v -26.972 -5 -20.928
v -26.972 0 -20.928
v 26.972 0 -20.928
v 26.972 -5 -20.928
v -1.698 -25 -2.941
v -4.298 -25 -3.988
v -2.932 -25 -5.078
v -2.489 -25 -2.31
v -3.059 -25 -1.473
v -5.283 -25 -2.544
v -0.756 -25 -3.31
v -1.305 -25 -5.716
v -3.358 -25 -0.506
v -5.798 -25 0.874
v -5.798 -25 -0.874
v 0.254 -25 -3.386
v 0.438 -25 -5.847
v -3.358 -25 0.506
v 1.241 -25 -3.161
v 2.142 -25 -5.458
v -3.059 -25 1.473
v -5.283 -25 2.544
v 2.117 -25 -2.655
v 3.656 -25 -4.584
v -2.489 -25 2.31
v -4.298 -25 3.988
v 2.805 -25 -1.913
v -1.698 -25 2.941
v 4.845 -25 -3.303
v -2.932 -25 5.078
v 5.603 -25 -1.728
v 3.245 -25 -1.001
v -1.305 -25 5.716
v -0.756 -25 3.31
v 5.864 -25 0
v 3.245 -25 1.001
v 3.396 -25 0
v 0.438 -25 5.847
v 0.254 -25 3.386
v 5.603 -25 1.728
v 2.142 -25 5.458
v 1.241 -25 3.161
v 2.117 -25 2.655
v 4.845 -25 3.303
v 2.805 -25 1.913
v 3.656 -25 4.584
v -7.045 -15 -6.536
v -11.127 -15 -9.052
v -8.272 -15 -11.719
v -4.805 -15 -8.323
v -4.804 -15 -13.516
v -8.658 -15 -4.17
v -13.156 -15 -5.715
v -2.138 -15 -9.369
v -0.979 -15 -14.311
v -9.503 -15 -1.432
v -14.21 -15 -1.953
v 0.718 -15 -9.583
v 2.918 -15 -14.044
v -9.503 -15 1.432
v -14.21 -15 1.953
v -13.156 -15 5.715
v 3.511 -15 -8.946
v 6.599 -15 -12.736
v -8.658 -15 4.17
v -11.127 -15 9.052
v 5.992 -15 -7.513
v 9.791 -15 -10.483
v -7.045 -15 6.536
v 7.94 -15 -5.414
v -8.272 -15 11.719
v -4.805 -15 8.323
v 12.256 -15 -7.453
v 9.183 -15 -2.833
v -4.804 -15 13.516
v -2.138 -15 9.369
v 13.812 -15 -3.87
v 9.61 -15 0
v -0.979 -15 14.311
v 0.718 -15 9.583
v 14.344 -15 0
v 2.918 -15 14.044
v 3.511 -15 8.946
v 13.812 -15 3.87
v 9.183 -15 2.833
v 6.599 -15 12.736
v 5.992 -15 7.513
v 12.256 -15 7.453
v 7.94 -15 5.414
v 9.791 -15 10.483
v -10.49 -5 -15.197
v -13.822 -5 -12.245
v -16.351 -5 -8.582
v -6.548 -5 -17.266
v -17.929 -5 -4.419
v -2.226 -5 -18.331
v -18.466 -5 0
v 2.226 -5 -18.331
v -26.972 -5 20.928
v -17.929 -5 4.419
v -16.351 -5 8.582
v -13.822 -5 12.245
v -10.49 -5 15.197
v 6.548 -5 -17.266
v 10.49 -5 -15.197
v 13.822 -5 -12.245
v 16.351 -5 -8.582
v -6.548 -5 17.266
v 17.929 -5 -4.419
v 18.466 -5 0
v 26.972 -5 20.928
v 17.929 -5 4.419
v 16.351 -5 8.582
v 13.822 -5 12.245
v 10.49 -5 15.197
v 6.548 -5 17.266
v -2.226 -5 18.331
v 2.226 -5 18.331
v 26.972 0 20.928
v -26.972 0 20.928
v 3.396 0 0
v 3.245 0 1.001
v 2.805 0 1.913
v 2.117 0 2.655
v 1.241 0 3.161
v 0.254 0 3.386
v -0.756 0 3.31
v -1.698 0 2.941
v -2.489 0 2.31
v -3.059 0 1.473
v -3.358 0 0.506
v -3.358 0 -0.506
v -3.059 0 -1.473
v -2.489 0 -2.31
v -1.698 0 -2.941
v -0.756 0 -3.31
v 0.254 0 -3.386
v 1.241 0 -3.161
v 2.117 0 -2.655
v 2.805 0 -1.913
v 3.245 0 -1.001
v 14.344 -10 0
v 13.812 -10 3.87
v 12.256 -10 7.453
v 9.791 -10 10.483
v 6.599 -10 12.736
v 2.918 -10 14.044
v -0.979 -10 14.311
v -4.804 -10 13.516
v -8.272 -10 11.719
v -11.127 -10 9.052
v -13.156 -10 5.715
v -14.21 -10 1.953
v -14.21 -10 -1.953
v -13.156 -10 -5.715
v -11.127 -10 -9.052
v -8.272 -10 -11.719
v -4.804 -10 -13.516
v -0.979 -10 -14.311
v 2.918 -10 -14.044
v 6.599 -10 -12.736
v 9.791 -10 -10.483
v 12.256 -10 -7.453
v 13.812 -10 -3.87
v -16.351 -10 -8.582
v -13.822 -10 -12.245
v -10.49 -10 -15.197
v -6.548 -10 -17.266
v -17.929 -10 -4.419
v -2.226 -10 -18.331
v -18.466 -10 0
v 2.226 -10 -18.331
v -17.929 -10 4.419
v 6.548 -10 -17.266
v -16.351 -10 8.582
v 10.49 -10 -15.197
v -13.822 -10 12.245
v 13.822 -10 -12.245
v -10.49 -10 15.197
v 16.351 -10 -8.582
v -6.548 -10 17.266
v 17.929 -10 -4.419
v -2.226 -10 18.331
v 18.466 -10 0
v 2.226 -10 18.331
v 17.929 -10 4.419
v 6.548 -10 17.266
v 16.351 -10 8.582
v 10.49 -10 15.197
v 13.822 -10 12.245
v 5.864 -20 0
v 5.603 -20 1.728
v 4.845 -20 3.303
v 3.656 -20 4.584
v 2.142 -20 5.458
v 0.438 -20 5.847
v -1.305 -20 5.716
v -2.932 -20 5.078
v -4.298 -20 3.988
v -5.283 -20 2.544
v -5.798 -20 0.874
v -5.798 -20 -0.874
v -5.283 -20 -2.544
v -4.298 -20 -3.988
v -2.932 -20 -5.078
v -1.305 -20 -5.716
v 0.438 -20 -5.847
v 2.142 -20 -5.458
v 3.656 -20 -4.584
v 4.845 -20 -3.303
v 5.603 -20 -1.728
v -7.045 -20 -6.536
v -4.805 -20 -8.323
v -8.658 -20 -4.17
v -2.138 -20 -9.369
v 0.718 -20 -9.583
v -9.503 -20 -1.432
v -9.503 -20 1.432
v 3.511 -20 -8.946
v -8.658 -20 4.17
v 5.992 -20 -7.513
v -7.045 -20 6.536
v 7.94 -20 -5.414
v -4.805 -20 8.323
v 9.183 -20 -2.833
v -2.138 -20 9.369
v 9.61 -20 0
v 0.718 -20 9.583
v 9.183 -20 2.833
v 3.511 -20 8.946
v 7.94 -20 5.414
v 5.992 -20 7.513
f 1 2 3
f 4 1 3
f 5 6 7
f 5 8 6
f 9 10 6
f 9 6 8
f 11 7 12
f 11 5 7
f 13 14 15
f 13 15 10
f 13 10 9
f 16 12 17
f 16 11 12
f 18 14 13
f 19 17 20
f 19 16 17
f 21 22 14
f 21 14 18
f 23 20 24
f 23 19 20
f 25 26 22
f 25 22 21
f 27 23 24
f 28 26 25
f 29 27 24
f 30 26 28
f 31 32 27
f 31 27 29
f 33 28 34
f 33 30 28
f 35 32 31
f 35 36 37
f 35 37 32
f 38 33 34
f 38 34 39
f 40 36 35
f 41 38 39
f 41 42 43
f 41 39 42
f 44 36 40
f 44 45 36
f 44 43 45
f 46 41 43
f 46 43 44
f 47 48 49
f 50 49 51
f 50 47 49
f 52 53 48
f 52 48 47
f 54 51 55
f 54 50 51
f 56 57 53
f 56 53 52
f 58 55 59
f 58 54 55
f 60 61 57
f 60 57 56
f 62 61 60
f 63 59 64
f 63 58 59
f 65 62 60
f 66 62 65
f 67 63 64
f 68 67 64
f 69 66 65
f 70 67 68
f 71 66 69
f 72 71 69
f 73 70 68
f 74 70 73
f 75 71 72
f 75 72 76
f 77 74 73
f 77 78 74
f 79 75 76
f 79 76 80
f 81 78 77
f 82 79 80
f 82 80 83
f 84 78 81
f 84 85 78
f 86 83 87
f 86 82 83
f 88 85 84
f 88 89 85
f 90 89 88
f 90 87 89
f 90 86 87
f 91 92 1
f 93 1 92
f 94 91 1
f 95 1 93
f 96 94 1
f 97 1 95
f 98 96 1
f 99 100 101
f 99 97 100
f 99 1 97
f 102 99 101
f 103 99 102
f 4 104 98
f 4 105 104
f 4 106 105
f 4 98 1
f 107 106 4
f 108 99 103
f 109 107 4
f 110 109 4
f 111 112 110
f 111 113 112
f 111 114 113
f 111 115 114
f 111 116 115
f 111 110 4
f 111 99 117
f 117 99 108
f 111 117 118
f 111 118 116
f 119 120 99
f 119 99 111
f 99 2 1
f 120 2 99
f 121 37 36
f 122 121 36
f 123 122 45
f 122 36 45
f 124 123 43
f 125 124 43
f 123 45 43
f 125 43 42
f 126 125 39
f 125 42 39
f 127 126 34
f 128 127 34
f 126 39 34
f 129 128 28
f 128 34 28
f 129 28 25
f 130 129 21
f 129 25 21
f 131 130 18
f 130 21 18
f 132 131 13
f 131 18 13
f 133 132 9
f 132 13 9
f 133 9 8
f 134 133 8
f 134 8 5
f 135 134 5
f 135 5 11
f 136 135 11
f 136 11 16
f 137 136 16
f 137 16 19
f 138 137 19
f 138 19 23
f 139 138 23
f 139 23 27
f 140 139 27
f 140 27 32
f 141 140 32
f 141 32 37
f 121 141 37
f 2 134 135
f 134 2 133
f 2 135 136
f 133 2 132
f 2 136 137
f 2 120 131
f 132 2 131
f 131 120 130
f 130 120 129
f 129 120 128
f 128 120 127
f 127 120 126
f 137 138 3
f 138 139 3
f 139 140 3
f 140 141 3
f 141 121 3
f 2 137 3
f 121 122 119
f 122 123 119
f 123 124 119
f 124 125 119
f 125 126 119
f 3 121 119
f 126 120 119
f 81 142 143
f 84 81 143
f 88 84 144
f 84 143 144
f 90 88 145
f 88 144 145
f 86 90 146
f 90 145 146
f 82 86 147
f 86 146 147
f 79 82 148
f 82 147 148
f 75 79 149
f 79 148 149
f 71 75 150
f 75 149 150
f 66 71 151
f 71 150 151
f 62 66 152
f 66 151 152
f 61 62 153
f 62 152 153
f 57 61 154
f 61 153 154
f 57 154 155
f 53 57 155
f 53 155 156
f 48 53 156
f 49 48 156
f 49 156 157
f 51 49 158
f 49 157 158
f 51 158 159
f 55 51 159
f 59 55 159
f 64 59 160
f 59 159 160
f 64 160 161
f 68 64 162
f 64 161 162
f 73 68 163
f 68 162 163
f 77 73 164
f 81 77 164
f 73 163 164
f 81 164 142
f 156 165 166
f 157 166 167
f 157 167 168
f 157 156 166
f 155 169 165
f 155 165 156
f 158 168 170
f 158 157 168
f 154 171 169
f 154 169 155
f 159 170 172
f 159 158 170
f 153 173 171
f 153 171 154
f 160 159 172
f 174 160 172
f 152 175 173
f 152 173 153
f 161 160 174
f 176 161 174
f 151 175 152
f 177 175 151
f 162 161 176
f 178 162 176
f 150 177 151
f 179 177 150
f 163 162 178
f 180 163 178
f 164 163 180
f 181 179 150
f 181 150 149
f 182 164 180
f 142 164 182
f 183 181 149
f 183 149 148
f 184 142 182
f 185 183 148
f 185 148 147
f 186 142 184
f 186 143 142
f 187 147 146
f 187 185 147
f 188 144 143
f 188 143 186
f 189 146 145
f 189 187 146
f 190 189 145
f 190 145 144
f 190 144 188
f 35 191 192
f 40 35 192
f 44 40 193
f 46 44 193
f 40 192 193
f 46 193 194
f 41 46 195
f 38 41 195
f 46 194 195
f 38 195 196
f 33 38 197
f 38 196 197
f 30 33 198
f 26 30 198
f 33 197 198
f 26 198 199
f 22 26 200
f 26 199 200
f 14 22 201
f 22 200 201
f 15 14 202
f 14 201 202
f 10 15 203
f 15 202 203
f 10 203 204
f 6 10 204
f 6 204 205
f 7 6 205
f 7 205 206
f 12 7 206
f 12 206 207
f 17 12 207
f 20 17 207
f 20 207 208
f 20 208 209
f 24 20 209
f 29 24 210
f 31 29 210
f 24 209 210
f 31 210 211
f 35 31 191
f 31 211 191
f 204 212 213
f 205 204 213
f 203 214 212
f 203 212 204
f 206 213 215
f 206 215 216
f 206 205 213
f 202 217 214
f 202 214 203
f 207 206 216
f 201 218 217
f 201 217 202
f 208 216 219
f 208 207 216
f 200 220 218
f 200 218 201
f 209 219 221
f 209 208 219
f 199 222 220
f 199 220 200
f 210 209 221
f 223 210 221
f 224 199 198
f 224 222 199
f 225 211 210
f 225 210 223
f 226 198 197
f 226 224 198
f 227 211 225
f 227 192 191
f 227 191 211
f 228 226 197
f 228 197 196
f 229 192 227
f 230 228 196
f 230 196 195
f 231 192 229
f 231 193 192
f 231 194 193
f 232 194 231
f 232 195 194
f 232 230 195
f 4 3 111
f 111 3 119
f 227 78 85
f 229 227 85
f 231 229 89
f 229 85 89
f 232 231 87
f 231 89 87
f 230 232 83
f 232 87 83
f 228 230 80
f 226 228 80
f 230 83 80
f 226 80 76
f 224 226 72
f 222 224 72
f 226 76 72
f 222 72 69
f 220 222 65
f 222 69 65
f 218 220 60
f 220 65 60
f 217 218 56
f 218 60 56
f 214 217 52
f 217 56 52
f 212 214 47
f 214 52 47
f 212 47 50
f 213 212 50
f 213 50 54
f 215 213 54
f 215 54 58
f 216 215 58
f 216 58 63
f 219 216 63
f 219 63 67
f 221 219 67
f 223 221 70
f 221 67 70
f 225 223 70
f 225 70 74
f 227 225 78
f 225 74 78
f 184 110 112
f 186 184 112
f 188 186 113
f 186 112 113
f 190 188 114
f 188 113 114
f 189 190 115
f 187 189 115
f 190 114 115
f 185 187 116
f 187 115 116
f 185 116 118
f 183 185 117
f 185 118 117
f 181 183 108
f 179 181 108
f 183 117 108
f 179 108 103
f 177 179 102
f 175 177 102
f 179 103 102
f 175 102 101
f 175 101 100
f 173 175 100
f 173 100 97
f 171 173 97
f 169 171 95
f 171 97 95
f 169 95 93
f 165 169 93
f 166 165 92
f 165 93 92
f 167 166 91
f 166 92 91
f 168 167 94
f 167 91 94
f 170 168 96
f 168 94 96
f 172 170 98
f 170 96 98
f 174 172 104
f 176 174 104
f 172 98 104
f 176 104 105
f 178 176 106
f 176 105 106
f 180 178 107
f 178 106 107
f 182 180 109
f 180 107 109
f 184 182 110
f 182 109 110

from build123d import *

# Parameters (mm, degrees)
F0_W      = 53.943
F0_H      = 41.85567
F1_DEPTH  = 5
F2_R      = 18.466
F3_DEPTH  = 5
F4_R      = 14.344
F5_DEPTH  = 5
F6_R      = 9.61
F7_DEPTH  = 5
F8_R      = 5.8635
F9_DEPTH  = 5
F10_R     = 3.3955
F11_DEPTH = 25.001


with BuildPart() as f1:
    # F0 (on Front) → F1 (new body)
    with BuildSketch(Plane.XZ):
        Rectangle(F0_W, F0_H)
    extrude(amount=F1_DEPTH)

    # F2 (on face) → F3 (join)
    with BuildSketch(Plane.XZ.offset(5)):
        Circle(F2_R)
    extrude(amount=F3_DEPTH)

    # F4 (on face) → F5 (join)
    with BuildSketch(Plane.XZ.offset(10)):
        Circle(F4_R)
    extrude(amount=F5_DEPTH)

    # F6 (on face) → F7 (join)
    with BuildSketch(Plane.XZ.offset(15)):
        Circle(F6_R)
    extrude(amount=F7_DEPTH)

    # F8 (on face) → F9 (join)
    with BuildSketch(Plane.XZ.offset(20)):
        Circle(F8_R)
    extrude(amount=F9_DEPTH)

    # F10 (on face) → F11 (cut, through all)
    with BuildSketch(Plane.XZ.offset(25)):
        Circle(F10_R)
    extrude(amount=-F11_DEPTH, mode=Mode.SUBTRACT)


solid = f1.part
